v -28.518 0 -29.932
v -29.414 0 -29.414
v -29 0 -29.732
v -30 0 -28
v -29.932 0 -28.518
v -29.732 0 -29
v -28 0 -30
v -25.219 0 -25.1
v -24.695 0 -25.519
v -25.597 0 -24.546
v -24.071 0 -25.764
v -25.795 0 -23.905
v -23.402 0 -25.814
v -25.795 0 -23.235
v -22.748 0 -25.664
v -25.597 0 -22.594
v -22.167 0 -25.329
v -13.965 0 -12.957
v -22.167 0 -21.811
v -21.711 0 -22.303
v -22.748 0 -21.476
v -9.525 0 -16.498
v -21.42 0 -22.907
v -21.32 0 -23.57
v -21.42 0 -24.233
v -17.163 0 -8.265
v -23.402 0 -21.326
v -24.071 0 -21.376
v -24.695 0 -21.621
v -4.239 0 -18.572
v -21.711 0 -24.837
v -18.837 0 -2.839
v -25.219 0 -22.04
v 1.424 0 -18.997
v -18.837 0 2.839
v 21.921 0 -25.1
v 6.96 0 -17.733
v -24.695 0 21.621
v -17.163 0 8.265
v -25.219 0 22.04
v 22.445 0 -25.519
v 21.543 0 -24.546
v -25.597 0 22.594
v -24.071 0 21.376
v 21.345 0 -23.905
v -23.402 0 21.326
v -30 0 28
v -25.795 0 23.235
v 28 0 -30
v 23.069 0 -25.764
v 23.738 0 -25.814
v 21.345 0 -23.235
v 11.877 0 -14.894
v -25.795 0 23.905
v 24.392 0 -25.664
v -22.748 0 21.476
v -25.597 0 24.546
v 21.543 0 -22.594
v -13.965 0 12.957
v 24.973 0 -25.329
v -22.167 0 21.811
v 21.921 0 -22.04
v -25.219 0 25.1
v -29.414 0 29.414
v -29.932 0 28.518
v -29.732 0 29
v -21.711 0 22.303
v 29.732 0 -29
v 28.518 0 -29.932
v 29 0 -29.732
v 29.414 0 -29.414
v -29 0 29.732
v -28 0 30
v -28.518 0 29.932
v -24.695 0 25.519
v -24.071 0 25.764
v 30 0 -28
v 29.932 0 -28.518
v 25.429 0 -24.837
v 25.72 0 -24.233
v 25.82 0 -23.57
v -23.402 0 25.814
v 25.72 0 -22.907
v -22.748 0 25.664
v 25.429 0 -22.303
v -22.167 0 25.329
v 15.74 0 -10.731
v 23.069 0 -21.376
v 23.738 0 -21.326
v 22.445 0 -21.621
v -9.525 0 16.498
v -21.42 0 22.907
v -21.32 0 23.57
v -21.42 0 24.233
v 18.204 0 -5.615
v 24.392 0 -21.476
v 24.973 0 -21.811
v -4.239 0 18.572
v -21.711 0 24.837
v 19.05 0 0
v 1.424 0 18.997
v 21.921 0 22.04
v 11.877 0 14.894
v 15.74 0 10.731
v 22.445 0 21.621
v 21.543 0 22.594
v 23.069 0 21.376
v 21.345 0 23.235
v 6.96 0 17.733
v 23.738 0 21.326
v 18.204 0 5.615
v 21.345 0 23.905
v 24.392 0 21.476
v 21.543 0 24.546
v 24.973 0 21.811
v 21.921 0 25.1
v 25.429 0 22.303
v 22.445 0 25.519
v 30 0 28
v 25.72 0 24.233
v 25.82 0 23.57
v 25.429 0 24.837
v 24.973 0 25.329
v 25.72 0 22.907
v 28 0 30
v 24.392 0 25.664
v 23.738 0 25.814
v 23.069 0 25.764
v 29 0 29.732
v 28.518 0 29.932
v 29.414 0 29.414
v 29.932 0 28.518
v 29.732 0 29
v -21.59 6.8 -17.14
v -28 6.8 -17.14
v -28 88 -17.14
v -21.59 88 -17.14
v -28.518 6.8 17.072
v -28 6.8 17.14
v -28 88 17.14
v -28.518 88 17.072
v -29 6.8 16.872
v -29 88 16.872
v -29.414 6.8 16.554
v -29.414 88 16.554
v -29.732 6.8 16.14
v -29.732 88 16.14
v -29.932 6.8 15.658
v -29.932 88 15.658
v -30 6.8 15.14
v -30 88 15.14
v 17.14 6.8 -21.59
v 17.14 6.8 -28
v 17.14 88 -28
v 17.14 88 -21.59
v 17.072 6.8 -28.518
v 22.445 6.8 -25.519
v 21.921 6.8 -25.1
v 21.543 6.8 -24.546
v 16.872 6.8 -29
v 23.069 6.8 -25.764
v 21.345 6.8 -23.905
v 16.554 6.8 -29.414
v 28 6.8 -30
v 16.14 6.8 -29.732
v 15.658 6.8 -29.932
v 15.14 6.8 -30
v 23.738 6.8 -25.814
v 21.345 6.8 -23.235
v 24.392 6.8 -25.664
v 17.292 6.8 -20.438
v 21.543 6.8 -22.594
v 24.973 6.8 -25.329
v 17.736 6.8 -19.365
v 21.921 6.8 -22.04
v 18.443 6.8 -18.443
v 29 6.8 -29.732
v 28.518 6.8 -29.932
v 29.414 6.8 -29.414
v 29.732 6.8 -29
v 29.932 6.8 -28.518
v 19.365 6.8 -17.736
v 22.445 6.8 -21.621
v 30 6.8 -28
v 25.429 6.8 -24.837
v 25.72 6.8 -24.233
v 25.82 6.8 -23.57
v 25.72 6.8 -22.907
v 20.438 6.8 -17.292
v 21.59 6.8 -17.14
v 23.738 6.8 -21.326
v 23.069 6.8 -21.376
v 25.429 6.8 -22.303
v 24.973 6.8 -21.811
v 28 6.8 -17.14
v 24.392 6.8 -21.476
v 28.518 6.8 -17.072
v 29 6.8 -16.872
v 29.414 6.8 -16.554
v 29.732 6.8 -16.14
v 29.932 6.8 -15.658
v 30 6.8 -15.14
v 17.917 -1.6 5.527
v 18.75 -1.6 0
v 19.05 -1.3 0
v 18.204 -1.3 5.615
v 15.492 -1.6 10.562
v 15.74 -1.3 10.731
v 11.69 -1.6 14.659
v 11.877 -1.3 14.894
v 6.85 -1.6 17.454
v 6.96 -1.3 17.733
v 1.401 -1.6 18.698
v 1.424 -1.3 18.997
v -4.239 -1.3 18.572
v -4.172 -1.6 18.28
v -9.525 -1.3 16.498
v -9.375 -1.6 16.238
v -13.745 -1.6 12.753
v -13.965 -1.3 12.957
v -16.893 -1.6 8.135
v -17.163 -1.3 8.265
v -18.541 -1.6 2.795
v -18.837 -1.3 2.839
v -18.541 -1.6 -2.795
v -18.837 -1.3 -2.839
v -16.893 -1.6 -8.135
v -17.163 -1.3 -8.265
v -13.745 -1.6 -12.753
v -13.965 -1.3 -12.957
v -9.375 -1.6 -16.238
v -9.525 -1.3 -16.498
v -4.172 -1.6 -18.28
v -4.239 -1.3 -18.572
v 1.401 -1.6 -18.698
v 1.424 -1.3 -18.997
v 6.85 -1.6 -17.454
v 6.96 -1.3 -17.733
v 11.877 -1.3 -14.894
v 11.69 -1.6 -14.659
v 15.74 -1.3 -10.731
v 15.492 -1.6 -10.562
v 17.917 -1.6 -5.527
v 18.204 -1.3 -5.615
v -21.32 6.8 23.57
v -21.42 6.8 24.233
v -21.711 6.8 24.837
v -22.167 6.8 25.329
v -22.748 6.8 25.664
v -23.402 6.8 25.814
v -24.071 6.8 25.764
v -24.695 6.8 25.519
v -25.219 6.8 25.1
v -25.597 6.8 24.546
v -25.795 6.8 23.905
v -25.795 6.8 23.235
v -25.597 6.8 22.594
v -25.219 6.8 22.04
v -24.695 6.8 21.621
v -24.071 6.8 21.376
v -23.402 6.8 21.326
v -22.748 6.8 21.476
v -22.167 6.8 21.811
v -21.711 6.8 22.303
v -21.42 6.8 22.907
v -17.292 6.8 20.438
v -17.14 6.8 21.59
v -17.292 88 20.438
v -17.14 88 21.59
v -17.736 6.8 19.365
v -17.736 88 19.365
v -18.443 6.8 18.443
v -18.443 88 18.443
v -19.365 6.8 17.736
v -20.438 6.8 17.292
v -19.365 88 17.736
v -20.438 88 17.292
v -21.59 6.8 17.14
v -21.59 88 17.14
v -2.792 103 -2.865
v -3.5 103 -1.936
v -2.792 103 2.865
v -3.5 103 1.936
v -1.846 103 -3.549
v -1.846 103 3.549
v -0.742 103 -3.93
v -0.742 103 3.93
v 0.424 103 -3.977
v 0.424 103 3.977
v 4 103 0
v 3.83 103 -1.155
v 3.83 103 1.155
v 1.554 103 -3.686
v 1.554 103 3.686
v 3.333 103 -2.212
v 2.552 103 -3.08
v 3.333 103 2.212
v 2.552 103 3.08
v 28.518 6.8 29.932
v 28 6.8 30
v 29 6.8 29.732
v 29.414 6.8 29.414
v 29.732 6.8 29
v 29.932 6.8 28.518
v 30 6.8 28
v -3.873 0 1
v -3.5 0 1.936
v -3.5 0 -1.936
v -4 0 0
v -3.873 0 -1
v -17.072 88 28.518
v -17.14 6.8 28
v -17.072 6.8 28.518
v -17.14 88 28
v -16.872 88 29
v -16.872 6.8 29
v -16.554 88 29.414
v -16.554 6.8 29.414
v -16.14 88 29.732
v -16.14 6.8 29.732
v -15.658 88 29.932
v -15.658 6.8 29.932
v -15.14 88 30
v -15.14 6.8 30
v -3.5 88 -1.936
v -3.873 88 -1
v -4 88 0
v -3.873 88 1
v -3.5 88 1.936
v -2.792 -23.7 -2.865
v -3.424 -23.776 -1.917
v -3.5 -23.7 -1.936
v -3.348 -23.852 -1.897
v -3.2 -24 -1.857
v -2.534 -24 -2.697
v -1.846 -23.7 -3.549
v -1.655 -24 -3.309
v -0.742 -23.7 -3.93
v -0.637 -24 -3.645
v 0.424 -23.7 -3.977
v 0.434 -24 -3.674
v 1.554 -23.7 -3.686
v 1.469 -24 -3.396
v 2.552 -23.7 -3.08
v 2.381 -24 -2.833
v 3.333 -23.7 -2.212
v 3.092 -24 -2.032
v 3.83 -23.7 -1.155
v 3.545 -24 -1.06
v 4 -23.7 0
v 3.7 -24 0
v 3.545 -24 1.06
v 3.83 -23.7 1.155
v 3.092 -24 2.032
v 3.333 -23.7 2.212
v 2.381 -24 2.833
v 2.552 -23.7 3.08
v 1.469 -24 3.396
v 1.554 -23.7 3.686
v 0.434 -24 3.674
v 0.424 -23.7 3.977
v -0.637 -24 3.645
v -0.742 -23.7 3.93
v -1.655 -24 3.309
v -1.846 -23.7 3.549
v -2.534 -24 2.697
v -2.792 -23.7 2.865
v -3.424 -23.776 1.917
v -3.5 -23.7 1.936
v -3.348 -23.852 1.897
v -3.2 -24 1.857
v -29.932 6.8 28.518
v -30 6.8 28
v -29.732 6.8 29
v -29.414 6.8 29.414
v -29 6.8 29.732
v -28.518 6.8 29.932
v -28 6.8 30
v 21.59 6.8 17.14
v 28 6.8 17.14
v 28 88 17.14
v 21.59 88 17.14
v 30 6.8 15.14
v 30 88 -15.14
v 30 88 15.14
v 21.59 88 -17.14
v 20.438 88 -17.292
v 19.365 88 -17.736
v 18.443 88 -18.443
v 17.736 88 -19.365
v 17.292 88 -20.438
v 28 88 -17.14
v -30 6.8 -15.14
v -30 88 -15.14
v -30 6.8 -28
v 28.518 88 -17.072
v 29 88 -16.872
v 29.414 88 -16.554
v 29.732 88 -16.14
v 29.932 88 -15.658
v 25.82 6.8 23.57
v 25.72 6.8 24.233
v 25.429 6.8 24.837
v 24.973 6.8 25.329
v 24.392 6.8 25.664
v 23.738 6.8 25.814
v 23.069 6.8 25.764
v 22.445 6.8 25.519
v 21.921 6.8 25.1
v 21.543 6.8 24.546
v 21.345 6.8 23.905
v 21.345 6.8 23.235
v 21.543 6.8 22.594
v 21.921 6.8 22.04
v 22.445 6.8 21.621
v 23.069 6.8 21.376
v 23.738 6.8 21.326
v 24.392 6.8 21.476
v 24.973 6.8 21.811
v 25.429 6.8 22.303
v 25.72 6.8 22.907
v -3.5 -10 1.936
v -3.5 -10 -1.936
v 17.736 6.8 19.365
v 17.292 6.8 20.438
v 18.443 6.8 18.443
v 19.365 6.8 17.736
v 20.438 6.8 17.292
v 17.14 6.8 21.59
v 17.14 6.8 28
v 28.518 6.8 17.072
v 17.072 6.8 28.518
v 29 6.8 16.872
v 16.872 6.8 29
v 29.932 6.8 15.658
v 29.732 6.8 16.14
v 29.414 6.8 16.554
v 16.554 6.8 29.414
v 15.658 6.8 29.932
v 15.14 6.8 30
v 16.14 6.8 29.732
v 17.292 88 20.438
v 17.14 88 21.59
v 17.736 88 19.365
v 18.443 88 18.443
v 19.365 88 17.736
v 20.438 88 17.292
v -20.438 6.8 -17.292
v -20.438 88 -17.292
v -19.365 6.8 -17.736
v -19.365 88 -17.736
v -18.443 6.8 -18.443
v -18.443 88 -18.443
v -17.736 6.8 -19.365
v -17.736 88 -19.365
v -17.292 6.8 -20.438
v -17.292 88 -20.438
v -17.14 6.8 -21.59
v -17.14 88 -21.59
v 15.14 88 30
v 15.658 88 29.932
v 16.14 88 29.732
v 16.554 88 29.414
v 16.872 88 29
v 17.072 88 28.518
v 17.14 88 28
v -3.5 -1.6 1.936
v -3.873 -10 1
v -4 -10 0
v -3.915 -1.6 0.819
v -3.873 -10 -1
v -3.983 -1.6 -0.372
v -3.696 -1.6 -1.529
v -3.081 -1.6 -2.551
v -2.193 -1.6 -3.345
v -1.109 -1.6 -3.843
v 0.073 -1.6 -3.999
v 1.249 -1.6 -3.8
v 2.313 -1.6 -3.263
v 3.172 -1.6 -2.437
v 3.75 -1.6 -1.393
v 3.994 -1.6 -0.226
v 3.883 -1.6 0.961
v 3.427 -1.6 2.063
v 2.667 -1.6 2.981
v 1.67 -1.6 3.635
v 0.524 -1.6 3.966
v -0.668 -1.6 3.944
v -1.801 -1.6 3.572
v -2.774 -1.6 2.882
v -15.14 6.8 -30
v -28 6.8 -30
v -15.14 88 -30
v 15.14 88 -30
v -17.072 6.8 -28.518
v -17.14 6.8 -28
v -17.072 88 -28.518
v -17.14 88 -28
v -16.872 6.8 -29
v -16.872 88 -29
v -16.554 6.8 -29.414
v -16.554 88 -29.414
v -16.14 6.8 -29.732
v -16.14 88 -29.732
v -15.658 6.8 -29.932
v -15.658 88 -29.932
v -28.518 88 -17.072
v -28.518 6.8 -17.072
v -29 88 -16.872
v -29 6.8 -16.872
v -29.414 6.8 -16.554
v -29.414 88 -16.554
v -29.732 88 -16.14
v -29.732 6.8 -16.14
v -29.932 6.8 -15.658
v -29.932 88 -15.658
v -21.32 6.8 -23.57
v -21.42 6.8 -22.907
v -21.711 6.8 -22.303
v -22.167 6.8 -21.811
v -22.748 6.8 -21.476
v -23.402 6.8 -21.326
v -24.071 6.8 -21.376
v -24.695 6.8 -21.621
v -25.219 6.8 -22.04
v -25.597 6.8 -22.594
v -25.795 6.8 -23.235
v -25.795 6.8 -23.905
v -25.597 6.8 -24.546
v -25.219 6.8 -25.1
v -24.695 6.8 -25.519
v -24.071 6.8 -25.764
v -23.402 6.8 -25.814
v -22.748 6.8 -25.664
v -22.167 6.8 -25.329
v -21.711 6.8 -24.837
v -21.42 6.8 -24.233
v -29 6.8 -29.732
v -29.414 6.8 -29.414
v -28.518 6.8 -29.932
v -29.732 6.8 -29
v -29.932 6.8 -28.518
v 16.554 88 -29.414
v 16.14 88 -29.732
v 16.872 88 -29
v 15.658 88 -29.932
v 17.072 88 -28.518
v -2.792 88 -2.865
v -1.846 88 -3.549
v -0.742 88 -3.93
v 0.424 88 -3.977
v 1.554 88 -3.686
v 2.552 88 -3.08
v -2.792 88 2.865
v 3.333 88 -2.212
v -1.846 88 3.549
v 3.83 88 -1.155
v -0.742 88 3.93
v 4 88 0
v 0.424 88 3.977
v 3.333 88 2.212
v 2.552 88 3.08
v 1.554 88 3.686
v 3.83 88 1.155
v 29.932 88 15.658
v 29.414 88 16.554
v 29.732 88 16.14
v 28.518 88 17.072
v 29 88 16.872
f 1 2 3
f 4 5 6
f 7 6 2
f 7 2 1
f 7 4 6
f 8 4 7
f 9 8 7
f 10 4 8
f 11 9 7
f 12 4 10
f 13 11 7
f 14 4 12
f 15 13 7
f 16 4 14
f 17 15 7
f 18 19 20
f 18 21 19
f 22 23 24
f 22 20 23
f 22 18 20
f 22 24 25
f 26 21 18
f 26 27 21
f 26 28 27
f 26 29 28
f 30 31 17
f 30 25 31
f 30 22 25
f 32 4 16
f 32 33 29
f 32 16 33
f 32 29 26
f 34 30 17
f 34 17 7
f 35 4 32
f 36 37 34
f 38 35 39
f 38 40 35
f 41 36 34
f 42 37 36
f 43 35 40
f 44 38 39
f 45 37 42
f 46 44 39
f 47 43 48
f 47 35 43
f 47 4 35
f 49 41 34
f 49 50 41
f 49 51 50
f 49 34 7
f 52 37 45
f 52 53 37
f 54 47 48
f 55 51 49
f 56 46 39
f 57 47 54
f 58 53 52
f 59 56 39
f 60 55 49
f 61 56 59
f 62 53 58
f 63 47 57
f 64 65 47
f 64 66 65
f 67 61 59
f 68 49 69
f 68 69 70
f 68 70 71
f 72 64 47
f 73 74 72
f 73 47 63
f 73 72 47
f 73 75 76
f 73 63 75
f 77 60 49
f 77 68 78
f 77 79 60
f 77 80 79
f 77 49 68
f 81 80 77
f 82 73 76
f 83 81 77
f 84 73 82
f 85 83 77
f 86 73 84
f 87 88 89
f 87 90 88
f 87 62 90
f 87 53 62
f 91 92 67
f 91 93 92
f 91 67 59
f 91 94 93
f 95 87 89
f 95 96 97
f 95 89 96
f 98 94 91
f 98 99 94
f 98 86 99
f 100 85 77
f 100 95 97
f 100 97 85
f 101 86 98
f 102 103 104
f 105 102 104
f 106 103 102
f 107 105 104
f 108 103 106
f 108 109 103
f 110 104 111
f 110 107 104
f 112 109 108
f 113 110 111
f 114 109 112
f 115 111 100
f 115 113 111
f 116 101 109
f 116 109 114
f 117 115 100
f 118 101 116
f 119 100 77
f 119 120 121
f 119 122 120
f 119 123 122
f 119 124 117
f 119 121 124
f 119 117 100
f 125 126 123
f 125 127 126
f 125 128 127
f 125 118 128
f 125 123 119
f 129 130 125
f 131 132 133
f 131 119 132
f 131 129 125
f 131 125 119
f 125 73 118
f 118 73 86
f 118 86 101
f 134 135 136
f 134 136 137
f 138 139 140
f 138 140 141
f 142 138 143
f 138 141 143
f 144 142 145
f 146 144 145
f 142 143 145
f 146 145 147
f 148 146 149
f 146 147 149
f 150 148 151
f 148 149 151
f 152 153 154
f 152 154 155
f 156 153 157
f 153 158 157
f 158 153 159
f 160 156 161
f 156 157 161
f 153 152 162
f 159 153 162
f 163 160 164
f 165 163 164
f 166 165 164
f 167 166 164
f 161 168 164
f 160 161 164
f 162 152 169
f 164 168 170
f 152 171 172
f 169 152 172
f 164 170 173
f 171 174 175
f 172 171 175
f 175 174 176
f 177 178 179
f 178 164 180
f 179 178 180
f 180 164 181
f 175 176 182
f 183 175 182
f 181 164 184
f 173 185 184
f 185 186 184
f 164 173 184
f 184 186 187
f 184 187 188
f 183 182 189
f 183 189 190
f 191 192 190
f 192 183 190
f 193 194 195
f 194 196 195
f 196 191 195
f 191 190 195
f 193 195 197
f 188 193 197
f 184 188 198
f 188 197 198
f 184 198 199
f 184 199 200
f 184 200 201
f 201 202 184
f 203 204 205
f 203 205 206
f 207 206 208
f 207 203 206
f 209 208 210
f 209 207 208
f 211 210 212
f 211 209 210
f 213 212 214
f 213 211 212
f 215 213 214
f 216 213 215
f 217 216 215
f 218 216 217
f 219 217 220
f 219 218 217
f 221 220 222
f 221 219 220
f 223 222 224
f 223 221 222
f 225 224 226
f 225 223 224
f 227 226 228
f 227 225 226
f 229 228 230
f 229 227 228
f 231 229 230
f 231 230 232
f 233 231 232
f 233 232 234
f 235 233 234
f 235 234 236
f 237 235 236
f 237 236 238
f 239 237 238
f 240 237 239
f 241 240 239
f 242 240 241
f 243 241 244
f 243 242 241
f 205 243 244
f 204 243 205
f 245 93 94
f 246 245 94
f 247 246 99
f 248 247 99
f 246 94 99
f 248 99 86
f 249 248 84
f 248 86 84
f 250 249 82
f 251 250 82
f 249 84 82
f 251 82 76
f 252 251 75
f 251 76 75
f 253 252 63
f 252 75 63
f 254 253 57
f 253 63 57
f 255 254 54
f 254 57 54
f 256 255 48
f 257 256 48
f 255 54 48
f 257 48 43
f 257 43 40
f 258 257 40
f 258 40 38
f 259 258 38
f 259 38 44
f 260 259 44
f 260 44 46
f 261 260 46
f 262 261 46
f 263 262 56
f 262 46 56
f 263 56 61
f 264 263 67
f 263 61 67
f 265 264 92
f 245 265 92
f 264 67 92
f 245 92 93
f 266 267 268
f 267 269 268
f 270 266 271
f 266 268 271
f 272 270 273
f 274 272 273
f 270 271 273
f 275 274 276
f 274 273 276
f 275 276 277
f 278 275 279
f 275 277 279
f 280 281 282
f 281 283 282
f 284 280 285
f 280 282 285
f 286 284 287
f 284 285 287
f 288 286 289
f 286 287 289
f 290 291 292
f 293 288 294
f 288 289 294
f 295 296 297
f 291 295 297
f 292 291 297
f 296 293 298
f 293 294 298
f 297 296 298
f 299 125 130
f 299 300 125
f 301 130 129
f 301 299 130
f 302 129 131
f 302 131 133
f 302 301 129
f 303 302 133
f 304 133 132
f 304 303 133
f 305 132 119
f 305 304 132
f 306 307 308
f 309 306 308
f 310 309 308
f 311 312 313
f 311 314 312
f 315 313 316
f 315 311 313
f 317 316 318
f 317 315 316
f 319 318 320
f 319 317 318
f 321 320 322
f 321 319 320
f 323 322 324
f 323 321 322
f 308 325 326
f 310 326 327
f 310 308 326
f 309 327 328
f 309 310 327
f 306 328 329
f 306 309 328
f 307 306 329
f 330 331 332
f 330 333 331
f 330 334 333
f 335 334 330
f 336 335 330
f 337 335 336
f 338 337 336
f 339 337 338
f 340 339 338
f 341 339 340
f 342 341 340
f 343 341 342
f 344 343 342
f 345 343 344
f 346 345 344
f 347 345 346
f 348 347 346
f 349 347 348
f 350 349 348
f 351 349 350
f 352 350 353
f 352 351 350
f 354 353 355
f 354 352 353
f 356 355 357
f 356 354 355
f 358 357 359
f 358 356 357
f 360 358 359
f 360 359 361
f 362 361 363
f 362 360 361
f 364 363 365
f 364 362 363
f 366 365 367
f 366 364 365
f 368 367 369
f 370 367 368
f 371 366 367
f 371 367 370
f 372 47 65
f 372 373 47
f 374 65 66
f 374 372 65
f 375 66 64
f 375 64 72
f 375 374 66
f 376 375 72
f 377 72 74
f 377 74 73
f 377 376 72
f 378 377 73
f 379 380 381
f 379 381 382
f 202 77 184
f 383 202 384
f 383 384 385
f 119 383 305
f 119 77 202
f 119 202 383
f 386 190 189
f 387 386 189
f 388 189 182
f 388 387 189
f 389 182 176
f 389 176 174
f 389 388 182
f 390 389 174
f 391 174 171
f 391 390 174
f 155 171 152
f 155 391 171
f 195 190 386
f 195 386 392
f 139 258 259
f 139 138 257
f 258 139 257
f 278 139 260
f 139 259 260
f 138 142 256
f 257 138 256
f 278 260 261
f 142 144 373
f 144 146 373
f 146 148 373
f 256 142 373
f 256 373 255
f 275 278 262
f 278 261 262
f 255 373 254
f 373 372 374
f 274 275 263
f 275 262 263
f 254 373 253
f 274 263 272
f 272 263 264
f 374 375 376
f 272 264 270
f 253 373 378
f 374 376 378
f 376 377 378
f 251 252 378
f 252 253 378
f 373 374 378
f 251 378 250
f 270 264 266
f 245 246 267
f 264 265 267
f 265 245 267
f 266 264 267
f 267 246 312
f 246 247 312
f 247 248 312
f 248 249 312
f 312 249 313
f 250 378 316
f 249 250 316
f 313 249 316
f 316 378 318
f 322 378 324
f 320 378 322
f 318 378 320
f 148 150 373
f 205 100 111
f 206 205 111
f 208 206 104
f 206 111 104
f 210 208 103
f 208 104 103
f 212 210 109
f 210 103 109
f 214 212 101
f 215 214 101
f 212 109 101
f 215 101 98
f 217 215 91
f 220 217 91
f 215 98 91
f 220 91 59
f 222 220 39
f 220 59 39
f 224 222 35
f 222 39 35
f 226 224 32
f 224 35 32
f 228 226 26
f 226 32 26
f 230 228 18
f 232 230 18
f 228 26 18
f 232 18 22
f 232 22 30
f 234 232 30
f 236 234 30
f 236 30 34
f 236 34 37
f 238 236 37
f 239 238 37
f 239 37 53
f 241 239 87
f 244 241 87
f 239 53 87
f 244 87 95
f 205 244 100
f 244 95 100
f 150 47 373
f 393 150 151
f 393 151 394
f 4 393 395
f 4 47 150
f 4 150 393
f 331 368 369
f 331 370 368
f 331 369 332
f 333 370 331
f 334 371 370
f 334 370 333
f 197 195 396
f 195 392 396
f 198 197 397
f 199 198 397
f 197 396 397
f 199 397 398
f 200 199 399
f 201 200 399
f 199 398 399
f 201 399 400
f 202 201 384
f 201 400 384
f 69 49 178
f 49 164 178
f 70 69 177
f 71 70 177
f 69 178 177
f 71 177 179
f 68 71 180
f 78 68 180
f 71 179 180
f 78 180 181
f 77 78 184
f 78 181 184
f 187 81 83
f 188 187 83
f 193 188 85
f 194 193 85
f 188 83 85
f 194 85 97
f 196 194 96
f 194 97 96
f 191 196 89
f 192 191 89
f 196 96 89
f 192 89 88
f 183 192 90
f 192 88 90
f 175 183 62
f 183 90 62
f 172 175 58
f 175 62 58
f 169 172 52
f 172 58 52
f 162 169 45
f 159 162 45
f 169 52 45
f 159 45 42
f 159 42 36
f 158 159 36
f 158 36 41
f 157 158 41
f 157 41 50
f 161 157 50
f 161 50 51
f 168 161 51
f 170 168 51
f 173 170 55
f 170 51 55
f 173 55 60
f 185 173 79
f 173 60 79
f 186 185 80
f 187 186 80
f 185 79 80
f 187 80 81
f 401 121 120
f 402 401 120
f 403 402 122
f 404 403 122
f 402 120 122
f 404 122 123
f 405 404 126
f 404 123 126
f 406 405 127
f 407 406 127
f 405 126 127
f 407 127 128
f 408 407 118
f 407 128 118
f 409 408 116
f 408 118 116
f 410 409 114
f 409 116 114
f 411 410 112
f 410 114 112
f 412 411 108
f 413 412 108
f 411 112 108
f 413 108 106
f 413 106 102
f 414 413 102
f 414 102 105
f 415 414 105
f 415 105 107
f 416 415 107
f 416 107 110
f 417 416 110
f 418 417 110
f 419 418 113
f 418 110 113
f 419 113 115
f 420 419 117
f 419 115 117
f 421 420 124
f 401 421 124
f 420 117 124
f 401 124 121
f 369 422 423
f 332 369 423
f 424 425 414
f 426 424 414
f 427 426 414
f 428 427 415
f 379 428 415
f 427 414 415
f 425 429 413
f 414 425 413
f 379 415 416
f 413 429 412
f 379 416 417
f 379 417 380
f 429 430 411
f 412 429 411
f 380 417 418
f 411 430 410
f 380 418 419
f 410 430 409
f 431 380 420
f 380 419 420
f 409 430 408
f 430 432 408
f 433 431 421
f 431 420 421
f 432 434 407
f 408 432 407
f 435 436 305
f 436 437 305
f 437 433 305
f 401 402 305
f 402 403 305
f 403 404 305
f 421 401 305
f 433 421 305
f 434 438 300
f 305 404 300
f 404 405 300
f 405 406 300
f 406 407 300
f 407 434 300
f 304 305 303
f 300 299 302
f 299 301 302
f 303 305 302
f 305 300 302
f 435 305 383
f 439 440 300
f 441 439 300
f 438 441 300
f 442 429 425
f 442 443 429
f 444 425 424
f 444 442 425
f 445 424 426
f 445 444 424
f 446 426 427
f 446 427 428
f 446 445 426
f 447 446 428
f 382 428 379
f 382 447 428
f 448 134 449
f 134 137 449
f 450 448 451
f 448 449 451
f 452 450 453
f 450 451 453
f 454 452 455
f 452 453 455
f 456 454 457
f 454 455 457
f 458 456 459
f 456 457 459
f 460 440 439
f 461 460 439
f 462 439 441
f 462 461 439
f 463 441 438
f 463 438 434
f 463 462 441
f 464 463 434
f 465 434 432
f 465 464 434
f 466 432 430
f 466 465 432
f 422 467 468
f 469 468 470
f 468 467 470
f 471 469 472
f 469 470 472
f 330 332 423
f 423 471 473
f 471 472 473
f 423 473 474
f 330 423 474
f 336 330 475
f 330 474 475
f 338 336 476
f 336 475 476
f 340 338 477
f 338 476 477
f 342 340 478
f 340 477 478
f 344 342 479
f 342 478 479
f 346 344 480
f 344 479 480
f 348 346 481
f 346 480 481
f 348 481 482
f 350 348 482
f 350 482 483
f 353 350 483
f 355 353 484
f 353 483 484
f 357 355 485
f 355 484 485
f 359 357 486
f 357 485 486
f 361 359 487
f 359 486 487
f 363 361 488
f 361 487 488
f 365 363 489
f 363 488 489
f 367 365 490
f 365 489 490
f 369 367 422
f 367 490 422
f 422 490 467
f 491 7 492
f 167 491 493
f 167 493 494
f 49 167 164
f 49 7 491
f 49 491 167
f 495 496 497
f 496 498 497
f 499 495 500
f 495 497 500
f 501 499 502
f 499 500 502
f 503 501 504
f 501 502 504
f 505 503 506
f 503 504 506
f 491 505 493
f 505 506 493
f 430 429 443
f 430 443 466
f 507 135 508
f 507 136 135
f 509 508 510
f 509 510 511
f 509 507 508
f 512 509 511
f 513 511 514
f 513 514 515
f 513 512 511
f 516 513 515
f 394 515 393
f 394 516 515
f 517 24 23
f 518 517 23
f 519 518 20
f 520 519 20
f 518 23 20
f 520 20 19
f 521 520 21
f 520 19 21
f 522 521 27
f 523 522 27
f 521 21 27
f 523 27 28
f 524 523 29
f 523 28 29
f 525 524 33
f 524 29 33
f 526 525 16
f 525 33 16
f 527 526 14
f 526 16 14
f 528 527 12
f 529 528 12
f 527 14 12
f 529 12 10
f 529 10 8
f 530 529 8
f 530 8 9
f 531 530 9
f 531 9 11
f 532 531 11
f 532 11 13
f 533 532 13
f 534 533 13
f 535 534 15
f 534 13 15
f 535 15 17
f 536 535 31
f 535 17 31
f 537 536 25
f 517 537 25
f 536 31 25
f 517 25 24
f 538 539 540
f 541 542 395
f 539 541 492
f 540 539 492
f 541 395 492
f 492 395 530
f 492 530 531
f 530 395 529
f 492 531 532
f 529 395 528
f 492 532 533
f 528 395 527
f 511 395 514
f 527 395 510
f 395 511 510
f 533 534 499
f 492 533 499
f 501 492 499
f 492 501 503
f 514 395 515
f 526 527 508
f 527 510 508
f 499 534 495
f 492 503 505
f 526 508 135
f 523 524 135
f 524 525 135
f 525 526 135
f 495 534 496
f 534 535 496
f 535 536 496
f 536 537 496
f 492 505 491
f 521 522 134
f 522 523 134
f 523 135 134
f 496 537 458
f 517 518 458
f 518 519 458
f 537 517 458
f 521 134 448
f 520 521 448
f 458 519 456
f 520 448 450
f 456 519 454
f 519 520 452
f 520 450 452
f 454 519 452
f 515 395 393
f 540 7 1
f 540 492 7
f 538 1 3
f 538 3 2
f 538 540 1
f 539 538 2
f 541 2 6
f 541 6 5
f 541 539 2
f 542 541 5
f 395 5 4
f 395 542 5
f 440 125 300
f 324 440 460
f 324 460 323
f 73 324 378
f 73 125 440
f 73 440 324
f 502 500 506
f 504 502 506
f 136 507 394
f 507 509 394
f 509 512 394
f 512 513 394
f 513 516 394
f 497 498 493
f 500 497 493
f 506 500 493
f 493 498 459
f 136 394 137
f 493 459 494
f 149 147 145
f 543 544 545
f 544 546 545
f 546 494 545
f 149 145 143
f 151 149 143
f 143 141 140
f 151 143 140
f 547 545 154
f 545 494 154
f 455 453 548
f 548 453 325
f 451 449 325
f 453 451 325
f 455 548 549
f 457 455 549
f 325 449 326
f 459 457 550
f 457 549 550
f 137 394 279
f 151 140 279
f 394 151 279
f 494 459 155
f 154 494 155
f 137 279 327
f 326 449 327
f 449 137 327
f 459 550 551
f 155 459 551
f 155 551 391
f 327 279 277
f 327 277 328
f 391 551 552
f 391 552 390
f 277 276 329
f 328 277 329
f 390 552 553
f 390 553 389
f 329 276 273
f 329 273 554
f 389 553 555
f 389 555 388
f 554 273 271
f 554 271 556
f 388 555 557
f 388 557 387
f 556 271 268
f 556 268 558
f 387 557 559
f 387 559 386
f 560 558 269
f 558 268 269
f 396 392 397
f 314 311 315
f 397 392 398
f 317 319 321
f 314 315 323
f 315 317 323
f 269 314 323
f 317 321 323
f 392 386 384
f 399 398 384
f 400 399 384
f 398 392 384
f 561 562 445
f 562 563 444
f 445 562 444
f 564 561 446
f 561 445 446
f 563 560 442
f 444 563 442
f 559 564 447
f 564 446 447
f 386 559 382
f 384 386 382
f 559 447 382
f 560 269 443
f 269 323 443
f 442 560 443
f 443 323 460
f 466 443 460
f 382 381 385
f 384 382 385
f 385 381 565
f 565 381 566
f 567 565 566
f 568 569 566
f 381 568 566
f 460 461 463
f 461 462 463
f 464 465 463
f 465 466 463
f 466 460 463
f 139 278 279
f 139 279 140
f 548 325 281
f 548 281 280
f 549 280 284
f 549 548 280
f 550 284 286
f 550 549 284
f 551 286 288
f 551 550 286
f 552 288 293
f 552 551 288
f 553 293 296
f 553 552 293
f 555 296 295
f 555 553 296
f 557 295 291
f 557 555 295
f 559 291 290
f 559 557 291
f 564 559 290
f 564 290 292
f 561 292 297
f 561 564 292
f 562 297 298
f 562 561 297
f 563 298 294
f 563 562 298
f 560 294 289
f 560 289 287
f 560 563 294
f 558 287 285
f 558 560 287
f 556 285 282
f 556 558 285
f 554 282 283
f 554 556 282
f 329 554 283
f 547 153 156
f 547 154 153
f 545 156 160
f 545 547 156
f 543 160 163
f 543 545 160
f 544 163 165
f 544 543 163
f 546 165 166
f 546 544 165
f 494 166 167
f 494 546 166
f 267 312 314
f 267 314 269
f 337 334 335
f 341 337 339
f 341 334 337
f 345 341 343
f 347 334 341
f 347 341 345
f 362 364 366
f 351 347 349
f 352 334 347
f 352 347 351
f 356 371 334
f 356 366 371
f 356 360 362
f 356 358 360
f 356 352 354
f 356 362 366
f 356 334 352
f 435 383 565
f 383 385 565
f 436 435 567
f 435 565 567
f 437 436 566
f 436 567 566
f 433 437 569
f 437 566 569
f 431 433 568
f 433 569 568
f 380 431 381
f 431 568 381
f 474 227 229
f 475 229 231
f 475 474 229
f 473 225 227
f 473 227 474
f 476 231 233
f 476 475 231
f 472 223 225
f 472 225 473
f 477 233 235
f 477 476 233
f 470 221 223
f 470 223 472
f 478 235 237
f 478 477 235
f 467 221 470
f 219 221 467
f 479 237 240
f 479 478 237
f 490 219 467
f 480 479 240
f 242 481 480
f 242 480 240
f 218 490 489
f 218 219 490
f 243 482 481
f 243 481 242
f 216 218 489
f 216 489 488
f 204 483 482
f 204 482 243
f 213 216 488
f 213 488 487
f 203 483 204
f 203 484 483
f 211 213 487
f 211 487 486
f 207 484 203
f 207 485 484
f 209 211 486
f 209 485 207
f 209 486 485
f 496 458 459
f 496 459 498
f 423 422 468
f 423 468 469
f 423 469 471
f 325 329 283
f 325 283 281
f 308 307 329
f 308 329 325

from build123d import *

# Parameters (mm, degrees)
F0_W     = 12.86
F0_H     = 12.86
F0_R     = 2.25
F0_R_2   = 19.05
F1_DEPTH = 6.8
F2_DEPTH = 1.6
F3_DEPTH = 88
F4_R     = 4.45
F5_R     = 2
F6_DEPTH = 10
F7_DEPTH = 24
F8_DEPTH = 103
F9_SIZE  = 0.3


with BuildPart() as f1:
    # F0 (on Front) → F1 (new body)
    with BuildSketch(Plane.XZ):
        with Locations((23.57, -23.57)):
            Rectangle(F0_W, F0_H)
        with Locations((23.57, -23.57)):
            Circle(F0_R, mode=Mode.SUBTRACT)
        Polygon((-17.14, -30), (17.14, -30), (17.14, -17.14), (30, -17.14), (30, 17.14), (17.14, 17.14), (17.14, 30), (-17.14, 30), (-17.14, 17.14), (-30, 17.14), (-30, -17.14), (-17.14, -17.14), align=None)
        Circle(F0_R_2, mode=Mode.SUBTRACT)
        with Locations((-23.57, -23.57)):
            Rectangle(F0_W, F0_H)
        with Locations((-23.57, -23.57)):
            Circle(F0_R, mode=Mode.SUBTRACT)
        with Locations((23.57, 23.57)):
            Rectangle(F0_W, F0_H)
        with Locations((23.57, 23.57)):
            Circle(F0_R, mode=Mode.SUBTRACT)
        with Locations((-23.57, 23.57)):
            Rectangle(F0_W, F0_H)
        with Locations((-23.57, 23.57)):
            Circle(F0_R, mode=Mode.SUBTRACT)
        Circle(F0_R_2)
        with BuildLine():
            ThreePointArc((-3.5, 1.9364916731), (1, 3.8729833462), (4, 0))
            ThreePointArc((4, 0), (1, -3.8729833462), (-3.5, -1.9364916731))
            ThreePointArc((-3.5, -1.9364916731), (-4, 0), (-3.5, 1.9364916731))
        make_face(mode=Mode.SUBTRACT)
    extrude(amount=-F1_DEPTH)

    # F0 (on Front) → F2 (join)
    with BuildSketch(Plane.XZ):
        Circle(F0_R_2)
        with BuildLine():
            ThreePointArc((-3.5, 1.9364916731), (1, 3.8729833462), (4, 0))
            ThreePointArc((4, 0), (1, -3.8729833462), (-3.5, -1.9364916731))
            ThreePointArc((-3.5, -1.9364916731), (-4, 0), (-3.5, 1.9364916731))
        make_face(mode=Mode.SUBTRACT)
    extrude(amount=F2_DEPTH)

    # F0 (on Front) → F3 (join)
    with BuildSketch(Plane.XZ):
        Polygon((-17.14, -30), (17.14, -30), (17.14, -17.14), (30, -17.14), (30, 17.14), (17.14, 17.14), (17.14, 30), (-17.14, 30), (-17.14, 17.14), (-30, 17.14), (-30, -17.14), (-17.14, -17.14), align=None)
        Circle(F0_R_2, mode=Mode.SUBTRACT)
        Circle(F0_R_2)
        with BuildLine():
            ThreePointArc((-3.5, 1.9364916731), (1, 3.8729833462), (4, 0))
            ThreePointArc((4, 0), (1, -3.8729833462), (-3.5, -1.9364916731))
            ThreePointArc((-3.5, -1.9364916731), (-4, 0), (-3.5, 1.9364916731))
        make_face(mode=Mode.SUBTRACT)
    extrude(amount=-F3_DEPTH)

    # F4
    f4_edges = [f1.edges().sort_by_distance(p)[0] for p in [
        (17.14, 47.4, 17.14),
        (17.14, 47.4, -17.14),
        (-17.14, 47.4, 17.14),
        (-17.14, 47.4, -17.14),
    ]]
    fillet(f4_edges, radius=F4_R)

    # F5
    f5_edges = [f1.edges().sort_by_distance(p)[0] for p in [
        (-30, 3.4, 30),
        (30, 3.4, 30),
        (-17.14, 47.4, 30),
        (-30, 47.4, 17.14),
        (17.14, 47.4, 30),
        (-30, 3.4, -30),
        (30, 3.4, -30),
        (30, 47.4, 17.14),
        (30, 47.4, -17.14),
        (17.14, 47.4, -30),
        (-17.14, 47.4, -30),
        (-30, 47.4, -17.14),
    ]]
    fillet(f5_edges, radius=F5_R)

    # F0 (on Front) → F6 (join)
    with BuildSketch(Plane.XZ):
        with BuildLine():
            Line((-3.5, -1.9364916731), (-3.5, 1.9364916731))
            ThreePointArc((-3.5, 1.9364916731), (-4, 0), (-3.5, -1.9364916731))
        make_face()
    extrude(amount=F6_DEPTH)

    # F0 (on Front) → F7 (join)
    with BuildSketch(Plane.XZ):
        with BuildLine():
            ThreePointArc((-3.5, -1.9364916731), (1, -3.8729833462), (4, 0))
            ThreePointArc((4, 0), (1, 3.8729833462), (-3.5, 1.9364916731))
            Line((-3.5, 1.9364916731), (-3.5, -1.9364916731))
        make_face()
    extrude(amount=F7_DEPTH)

    # F0 (on Front) → F8 (join)
    with BuildSketch(Plane.XZ):
        with BuildLine():
            ThreePointArc((-3.5, -1.9364916731), (1, -3.8729833462), (4, 0))
            ThreePointArc((4, 0), (1, 3.8729833462), (-3.5, 1.9364916731))
            Line((-3.5, 1.9364916731), (-3.5, -1.9364916731))
        make_face()
    extrude(amount=-F8_DEPTH)

    # F9
    f9_edges = [f1.edges().sort_by_distance(p)[0] for p in [
        (4, -24, 0),
        (-3.5, -24, 0),
        (-19.05, -1.6, 0),
    ]]
    chamfer(f9_edges, length=F9_SIZE)


solid = f1.part
